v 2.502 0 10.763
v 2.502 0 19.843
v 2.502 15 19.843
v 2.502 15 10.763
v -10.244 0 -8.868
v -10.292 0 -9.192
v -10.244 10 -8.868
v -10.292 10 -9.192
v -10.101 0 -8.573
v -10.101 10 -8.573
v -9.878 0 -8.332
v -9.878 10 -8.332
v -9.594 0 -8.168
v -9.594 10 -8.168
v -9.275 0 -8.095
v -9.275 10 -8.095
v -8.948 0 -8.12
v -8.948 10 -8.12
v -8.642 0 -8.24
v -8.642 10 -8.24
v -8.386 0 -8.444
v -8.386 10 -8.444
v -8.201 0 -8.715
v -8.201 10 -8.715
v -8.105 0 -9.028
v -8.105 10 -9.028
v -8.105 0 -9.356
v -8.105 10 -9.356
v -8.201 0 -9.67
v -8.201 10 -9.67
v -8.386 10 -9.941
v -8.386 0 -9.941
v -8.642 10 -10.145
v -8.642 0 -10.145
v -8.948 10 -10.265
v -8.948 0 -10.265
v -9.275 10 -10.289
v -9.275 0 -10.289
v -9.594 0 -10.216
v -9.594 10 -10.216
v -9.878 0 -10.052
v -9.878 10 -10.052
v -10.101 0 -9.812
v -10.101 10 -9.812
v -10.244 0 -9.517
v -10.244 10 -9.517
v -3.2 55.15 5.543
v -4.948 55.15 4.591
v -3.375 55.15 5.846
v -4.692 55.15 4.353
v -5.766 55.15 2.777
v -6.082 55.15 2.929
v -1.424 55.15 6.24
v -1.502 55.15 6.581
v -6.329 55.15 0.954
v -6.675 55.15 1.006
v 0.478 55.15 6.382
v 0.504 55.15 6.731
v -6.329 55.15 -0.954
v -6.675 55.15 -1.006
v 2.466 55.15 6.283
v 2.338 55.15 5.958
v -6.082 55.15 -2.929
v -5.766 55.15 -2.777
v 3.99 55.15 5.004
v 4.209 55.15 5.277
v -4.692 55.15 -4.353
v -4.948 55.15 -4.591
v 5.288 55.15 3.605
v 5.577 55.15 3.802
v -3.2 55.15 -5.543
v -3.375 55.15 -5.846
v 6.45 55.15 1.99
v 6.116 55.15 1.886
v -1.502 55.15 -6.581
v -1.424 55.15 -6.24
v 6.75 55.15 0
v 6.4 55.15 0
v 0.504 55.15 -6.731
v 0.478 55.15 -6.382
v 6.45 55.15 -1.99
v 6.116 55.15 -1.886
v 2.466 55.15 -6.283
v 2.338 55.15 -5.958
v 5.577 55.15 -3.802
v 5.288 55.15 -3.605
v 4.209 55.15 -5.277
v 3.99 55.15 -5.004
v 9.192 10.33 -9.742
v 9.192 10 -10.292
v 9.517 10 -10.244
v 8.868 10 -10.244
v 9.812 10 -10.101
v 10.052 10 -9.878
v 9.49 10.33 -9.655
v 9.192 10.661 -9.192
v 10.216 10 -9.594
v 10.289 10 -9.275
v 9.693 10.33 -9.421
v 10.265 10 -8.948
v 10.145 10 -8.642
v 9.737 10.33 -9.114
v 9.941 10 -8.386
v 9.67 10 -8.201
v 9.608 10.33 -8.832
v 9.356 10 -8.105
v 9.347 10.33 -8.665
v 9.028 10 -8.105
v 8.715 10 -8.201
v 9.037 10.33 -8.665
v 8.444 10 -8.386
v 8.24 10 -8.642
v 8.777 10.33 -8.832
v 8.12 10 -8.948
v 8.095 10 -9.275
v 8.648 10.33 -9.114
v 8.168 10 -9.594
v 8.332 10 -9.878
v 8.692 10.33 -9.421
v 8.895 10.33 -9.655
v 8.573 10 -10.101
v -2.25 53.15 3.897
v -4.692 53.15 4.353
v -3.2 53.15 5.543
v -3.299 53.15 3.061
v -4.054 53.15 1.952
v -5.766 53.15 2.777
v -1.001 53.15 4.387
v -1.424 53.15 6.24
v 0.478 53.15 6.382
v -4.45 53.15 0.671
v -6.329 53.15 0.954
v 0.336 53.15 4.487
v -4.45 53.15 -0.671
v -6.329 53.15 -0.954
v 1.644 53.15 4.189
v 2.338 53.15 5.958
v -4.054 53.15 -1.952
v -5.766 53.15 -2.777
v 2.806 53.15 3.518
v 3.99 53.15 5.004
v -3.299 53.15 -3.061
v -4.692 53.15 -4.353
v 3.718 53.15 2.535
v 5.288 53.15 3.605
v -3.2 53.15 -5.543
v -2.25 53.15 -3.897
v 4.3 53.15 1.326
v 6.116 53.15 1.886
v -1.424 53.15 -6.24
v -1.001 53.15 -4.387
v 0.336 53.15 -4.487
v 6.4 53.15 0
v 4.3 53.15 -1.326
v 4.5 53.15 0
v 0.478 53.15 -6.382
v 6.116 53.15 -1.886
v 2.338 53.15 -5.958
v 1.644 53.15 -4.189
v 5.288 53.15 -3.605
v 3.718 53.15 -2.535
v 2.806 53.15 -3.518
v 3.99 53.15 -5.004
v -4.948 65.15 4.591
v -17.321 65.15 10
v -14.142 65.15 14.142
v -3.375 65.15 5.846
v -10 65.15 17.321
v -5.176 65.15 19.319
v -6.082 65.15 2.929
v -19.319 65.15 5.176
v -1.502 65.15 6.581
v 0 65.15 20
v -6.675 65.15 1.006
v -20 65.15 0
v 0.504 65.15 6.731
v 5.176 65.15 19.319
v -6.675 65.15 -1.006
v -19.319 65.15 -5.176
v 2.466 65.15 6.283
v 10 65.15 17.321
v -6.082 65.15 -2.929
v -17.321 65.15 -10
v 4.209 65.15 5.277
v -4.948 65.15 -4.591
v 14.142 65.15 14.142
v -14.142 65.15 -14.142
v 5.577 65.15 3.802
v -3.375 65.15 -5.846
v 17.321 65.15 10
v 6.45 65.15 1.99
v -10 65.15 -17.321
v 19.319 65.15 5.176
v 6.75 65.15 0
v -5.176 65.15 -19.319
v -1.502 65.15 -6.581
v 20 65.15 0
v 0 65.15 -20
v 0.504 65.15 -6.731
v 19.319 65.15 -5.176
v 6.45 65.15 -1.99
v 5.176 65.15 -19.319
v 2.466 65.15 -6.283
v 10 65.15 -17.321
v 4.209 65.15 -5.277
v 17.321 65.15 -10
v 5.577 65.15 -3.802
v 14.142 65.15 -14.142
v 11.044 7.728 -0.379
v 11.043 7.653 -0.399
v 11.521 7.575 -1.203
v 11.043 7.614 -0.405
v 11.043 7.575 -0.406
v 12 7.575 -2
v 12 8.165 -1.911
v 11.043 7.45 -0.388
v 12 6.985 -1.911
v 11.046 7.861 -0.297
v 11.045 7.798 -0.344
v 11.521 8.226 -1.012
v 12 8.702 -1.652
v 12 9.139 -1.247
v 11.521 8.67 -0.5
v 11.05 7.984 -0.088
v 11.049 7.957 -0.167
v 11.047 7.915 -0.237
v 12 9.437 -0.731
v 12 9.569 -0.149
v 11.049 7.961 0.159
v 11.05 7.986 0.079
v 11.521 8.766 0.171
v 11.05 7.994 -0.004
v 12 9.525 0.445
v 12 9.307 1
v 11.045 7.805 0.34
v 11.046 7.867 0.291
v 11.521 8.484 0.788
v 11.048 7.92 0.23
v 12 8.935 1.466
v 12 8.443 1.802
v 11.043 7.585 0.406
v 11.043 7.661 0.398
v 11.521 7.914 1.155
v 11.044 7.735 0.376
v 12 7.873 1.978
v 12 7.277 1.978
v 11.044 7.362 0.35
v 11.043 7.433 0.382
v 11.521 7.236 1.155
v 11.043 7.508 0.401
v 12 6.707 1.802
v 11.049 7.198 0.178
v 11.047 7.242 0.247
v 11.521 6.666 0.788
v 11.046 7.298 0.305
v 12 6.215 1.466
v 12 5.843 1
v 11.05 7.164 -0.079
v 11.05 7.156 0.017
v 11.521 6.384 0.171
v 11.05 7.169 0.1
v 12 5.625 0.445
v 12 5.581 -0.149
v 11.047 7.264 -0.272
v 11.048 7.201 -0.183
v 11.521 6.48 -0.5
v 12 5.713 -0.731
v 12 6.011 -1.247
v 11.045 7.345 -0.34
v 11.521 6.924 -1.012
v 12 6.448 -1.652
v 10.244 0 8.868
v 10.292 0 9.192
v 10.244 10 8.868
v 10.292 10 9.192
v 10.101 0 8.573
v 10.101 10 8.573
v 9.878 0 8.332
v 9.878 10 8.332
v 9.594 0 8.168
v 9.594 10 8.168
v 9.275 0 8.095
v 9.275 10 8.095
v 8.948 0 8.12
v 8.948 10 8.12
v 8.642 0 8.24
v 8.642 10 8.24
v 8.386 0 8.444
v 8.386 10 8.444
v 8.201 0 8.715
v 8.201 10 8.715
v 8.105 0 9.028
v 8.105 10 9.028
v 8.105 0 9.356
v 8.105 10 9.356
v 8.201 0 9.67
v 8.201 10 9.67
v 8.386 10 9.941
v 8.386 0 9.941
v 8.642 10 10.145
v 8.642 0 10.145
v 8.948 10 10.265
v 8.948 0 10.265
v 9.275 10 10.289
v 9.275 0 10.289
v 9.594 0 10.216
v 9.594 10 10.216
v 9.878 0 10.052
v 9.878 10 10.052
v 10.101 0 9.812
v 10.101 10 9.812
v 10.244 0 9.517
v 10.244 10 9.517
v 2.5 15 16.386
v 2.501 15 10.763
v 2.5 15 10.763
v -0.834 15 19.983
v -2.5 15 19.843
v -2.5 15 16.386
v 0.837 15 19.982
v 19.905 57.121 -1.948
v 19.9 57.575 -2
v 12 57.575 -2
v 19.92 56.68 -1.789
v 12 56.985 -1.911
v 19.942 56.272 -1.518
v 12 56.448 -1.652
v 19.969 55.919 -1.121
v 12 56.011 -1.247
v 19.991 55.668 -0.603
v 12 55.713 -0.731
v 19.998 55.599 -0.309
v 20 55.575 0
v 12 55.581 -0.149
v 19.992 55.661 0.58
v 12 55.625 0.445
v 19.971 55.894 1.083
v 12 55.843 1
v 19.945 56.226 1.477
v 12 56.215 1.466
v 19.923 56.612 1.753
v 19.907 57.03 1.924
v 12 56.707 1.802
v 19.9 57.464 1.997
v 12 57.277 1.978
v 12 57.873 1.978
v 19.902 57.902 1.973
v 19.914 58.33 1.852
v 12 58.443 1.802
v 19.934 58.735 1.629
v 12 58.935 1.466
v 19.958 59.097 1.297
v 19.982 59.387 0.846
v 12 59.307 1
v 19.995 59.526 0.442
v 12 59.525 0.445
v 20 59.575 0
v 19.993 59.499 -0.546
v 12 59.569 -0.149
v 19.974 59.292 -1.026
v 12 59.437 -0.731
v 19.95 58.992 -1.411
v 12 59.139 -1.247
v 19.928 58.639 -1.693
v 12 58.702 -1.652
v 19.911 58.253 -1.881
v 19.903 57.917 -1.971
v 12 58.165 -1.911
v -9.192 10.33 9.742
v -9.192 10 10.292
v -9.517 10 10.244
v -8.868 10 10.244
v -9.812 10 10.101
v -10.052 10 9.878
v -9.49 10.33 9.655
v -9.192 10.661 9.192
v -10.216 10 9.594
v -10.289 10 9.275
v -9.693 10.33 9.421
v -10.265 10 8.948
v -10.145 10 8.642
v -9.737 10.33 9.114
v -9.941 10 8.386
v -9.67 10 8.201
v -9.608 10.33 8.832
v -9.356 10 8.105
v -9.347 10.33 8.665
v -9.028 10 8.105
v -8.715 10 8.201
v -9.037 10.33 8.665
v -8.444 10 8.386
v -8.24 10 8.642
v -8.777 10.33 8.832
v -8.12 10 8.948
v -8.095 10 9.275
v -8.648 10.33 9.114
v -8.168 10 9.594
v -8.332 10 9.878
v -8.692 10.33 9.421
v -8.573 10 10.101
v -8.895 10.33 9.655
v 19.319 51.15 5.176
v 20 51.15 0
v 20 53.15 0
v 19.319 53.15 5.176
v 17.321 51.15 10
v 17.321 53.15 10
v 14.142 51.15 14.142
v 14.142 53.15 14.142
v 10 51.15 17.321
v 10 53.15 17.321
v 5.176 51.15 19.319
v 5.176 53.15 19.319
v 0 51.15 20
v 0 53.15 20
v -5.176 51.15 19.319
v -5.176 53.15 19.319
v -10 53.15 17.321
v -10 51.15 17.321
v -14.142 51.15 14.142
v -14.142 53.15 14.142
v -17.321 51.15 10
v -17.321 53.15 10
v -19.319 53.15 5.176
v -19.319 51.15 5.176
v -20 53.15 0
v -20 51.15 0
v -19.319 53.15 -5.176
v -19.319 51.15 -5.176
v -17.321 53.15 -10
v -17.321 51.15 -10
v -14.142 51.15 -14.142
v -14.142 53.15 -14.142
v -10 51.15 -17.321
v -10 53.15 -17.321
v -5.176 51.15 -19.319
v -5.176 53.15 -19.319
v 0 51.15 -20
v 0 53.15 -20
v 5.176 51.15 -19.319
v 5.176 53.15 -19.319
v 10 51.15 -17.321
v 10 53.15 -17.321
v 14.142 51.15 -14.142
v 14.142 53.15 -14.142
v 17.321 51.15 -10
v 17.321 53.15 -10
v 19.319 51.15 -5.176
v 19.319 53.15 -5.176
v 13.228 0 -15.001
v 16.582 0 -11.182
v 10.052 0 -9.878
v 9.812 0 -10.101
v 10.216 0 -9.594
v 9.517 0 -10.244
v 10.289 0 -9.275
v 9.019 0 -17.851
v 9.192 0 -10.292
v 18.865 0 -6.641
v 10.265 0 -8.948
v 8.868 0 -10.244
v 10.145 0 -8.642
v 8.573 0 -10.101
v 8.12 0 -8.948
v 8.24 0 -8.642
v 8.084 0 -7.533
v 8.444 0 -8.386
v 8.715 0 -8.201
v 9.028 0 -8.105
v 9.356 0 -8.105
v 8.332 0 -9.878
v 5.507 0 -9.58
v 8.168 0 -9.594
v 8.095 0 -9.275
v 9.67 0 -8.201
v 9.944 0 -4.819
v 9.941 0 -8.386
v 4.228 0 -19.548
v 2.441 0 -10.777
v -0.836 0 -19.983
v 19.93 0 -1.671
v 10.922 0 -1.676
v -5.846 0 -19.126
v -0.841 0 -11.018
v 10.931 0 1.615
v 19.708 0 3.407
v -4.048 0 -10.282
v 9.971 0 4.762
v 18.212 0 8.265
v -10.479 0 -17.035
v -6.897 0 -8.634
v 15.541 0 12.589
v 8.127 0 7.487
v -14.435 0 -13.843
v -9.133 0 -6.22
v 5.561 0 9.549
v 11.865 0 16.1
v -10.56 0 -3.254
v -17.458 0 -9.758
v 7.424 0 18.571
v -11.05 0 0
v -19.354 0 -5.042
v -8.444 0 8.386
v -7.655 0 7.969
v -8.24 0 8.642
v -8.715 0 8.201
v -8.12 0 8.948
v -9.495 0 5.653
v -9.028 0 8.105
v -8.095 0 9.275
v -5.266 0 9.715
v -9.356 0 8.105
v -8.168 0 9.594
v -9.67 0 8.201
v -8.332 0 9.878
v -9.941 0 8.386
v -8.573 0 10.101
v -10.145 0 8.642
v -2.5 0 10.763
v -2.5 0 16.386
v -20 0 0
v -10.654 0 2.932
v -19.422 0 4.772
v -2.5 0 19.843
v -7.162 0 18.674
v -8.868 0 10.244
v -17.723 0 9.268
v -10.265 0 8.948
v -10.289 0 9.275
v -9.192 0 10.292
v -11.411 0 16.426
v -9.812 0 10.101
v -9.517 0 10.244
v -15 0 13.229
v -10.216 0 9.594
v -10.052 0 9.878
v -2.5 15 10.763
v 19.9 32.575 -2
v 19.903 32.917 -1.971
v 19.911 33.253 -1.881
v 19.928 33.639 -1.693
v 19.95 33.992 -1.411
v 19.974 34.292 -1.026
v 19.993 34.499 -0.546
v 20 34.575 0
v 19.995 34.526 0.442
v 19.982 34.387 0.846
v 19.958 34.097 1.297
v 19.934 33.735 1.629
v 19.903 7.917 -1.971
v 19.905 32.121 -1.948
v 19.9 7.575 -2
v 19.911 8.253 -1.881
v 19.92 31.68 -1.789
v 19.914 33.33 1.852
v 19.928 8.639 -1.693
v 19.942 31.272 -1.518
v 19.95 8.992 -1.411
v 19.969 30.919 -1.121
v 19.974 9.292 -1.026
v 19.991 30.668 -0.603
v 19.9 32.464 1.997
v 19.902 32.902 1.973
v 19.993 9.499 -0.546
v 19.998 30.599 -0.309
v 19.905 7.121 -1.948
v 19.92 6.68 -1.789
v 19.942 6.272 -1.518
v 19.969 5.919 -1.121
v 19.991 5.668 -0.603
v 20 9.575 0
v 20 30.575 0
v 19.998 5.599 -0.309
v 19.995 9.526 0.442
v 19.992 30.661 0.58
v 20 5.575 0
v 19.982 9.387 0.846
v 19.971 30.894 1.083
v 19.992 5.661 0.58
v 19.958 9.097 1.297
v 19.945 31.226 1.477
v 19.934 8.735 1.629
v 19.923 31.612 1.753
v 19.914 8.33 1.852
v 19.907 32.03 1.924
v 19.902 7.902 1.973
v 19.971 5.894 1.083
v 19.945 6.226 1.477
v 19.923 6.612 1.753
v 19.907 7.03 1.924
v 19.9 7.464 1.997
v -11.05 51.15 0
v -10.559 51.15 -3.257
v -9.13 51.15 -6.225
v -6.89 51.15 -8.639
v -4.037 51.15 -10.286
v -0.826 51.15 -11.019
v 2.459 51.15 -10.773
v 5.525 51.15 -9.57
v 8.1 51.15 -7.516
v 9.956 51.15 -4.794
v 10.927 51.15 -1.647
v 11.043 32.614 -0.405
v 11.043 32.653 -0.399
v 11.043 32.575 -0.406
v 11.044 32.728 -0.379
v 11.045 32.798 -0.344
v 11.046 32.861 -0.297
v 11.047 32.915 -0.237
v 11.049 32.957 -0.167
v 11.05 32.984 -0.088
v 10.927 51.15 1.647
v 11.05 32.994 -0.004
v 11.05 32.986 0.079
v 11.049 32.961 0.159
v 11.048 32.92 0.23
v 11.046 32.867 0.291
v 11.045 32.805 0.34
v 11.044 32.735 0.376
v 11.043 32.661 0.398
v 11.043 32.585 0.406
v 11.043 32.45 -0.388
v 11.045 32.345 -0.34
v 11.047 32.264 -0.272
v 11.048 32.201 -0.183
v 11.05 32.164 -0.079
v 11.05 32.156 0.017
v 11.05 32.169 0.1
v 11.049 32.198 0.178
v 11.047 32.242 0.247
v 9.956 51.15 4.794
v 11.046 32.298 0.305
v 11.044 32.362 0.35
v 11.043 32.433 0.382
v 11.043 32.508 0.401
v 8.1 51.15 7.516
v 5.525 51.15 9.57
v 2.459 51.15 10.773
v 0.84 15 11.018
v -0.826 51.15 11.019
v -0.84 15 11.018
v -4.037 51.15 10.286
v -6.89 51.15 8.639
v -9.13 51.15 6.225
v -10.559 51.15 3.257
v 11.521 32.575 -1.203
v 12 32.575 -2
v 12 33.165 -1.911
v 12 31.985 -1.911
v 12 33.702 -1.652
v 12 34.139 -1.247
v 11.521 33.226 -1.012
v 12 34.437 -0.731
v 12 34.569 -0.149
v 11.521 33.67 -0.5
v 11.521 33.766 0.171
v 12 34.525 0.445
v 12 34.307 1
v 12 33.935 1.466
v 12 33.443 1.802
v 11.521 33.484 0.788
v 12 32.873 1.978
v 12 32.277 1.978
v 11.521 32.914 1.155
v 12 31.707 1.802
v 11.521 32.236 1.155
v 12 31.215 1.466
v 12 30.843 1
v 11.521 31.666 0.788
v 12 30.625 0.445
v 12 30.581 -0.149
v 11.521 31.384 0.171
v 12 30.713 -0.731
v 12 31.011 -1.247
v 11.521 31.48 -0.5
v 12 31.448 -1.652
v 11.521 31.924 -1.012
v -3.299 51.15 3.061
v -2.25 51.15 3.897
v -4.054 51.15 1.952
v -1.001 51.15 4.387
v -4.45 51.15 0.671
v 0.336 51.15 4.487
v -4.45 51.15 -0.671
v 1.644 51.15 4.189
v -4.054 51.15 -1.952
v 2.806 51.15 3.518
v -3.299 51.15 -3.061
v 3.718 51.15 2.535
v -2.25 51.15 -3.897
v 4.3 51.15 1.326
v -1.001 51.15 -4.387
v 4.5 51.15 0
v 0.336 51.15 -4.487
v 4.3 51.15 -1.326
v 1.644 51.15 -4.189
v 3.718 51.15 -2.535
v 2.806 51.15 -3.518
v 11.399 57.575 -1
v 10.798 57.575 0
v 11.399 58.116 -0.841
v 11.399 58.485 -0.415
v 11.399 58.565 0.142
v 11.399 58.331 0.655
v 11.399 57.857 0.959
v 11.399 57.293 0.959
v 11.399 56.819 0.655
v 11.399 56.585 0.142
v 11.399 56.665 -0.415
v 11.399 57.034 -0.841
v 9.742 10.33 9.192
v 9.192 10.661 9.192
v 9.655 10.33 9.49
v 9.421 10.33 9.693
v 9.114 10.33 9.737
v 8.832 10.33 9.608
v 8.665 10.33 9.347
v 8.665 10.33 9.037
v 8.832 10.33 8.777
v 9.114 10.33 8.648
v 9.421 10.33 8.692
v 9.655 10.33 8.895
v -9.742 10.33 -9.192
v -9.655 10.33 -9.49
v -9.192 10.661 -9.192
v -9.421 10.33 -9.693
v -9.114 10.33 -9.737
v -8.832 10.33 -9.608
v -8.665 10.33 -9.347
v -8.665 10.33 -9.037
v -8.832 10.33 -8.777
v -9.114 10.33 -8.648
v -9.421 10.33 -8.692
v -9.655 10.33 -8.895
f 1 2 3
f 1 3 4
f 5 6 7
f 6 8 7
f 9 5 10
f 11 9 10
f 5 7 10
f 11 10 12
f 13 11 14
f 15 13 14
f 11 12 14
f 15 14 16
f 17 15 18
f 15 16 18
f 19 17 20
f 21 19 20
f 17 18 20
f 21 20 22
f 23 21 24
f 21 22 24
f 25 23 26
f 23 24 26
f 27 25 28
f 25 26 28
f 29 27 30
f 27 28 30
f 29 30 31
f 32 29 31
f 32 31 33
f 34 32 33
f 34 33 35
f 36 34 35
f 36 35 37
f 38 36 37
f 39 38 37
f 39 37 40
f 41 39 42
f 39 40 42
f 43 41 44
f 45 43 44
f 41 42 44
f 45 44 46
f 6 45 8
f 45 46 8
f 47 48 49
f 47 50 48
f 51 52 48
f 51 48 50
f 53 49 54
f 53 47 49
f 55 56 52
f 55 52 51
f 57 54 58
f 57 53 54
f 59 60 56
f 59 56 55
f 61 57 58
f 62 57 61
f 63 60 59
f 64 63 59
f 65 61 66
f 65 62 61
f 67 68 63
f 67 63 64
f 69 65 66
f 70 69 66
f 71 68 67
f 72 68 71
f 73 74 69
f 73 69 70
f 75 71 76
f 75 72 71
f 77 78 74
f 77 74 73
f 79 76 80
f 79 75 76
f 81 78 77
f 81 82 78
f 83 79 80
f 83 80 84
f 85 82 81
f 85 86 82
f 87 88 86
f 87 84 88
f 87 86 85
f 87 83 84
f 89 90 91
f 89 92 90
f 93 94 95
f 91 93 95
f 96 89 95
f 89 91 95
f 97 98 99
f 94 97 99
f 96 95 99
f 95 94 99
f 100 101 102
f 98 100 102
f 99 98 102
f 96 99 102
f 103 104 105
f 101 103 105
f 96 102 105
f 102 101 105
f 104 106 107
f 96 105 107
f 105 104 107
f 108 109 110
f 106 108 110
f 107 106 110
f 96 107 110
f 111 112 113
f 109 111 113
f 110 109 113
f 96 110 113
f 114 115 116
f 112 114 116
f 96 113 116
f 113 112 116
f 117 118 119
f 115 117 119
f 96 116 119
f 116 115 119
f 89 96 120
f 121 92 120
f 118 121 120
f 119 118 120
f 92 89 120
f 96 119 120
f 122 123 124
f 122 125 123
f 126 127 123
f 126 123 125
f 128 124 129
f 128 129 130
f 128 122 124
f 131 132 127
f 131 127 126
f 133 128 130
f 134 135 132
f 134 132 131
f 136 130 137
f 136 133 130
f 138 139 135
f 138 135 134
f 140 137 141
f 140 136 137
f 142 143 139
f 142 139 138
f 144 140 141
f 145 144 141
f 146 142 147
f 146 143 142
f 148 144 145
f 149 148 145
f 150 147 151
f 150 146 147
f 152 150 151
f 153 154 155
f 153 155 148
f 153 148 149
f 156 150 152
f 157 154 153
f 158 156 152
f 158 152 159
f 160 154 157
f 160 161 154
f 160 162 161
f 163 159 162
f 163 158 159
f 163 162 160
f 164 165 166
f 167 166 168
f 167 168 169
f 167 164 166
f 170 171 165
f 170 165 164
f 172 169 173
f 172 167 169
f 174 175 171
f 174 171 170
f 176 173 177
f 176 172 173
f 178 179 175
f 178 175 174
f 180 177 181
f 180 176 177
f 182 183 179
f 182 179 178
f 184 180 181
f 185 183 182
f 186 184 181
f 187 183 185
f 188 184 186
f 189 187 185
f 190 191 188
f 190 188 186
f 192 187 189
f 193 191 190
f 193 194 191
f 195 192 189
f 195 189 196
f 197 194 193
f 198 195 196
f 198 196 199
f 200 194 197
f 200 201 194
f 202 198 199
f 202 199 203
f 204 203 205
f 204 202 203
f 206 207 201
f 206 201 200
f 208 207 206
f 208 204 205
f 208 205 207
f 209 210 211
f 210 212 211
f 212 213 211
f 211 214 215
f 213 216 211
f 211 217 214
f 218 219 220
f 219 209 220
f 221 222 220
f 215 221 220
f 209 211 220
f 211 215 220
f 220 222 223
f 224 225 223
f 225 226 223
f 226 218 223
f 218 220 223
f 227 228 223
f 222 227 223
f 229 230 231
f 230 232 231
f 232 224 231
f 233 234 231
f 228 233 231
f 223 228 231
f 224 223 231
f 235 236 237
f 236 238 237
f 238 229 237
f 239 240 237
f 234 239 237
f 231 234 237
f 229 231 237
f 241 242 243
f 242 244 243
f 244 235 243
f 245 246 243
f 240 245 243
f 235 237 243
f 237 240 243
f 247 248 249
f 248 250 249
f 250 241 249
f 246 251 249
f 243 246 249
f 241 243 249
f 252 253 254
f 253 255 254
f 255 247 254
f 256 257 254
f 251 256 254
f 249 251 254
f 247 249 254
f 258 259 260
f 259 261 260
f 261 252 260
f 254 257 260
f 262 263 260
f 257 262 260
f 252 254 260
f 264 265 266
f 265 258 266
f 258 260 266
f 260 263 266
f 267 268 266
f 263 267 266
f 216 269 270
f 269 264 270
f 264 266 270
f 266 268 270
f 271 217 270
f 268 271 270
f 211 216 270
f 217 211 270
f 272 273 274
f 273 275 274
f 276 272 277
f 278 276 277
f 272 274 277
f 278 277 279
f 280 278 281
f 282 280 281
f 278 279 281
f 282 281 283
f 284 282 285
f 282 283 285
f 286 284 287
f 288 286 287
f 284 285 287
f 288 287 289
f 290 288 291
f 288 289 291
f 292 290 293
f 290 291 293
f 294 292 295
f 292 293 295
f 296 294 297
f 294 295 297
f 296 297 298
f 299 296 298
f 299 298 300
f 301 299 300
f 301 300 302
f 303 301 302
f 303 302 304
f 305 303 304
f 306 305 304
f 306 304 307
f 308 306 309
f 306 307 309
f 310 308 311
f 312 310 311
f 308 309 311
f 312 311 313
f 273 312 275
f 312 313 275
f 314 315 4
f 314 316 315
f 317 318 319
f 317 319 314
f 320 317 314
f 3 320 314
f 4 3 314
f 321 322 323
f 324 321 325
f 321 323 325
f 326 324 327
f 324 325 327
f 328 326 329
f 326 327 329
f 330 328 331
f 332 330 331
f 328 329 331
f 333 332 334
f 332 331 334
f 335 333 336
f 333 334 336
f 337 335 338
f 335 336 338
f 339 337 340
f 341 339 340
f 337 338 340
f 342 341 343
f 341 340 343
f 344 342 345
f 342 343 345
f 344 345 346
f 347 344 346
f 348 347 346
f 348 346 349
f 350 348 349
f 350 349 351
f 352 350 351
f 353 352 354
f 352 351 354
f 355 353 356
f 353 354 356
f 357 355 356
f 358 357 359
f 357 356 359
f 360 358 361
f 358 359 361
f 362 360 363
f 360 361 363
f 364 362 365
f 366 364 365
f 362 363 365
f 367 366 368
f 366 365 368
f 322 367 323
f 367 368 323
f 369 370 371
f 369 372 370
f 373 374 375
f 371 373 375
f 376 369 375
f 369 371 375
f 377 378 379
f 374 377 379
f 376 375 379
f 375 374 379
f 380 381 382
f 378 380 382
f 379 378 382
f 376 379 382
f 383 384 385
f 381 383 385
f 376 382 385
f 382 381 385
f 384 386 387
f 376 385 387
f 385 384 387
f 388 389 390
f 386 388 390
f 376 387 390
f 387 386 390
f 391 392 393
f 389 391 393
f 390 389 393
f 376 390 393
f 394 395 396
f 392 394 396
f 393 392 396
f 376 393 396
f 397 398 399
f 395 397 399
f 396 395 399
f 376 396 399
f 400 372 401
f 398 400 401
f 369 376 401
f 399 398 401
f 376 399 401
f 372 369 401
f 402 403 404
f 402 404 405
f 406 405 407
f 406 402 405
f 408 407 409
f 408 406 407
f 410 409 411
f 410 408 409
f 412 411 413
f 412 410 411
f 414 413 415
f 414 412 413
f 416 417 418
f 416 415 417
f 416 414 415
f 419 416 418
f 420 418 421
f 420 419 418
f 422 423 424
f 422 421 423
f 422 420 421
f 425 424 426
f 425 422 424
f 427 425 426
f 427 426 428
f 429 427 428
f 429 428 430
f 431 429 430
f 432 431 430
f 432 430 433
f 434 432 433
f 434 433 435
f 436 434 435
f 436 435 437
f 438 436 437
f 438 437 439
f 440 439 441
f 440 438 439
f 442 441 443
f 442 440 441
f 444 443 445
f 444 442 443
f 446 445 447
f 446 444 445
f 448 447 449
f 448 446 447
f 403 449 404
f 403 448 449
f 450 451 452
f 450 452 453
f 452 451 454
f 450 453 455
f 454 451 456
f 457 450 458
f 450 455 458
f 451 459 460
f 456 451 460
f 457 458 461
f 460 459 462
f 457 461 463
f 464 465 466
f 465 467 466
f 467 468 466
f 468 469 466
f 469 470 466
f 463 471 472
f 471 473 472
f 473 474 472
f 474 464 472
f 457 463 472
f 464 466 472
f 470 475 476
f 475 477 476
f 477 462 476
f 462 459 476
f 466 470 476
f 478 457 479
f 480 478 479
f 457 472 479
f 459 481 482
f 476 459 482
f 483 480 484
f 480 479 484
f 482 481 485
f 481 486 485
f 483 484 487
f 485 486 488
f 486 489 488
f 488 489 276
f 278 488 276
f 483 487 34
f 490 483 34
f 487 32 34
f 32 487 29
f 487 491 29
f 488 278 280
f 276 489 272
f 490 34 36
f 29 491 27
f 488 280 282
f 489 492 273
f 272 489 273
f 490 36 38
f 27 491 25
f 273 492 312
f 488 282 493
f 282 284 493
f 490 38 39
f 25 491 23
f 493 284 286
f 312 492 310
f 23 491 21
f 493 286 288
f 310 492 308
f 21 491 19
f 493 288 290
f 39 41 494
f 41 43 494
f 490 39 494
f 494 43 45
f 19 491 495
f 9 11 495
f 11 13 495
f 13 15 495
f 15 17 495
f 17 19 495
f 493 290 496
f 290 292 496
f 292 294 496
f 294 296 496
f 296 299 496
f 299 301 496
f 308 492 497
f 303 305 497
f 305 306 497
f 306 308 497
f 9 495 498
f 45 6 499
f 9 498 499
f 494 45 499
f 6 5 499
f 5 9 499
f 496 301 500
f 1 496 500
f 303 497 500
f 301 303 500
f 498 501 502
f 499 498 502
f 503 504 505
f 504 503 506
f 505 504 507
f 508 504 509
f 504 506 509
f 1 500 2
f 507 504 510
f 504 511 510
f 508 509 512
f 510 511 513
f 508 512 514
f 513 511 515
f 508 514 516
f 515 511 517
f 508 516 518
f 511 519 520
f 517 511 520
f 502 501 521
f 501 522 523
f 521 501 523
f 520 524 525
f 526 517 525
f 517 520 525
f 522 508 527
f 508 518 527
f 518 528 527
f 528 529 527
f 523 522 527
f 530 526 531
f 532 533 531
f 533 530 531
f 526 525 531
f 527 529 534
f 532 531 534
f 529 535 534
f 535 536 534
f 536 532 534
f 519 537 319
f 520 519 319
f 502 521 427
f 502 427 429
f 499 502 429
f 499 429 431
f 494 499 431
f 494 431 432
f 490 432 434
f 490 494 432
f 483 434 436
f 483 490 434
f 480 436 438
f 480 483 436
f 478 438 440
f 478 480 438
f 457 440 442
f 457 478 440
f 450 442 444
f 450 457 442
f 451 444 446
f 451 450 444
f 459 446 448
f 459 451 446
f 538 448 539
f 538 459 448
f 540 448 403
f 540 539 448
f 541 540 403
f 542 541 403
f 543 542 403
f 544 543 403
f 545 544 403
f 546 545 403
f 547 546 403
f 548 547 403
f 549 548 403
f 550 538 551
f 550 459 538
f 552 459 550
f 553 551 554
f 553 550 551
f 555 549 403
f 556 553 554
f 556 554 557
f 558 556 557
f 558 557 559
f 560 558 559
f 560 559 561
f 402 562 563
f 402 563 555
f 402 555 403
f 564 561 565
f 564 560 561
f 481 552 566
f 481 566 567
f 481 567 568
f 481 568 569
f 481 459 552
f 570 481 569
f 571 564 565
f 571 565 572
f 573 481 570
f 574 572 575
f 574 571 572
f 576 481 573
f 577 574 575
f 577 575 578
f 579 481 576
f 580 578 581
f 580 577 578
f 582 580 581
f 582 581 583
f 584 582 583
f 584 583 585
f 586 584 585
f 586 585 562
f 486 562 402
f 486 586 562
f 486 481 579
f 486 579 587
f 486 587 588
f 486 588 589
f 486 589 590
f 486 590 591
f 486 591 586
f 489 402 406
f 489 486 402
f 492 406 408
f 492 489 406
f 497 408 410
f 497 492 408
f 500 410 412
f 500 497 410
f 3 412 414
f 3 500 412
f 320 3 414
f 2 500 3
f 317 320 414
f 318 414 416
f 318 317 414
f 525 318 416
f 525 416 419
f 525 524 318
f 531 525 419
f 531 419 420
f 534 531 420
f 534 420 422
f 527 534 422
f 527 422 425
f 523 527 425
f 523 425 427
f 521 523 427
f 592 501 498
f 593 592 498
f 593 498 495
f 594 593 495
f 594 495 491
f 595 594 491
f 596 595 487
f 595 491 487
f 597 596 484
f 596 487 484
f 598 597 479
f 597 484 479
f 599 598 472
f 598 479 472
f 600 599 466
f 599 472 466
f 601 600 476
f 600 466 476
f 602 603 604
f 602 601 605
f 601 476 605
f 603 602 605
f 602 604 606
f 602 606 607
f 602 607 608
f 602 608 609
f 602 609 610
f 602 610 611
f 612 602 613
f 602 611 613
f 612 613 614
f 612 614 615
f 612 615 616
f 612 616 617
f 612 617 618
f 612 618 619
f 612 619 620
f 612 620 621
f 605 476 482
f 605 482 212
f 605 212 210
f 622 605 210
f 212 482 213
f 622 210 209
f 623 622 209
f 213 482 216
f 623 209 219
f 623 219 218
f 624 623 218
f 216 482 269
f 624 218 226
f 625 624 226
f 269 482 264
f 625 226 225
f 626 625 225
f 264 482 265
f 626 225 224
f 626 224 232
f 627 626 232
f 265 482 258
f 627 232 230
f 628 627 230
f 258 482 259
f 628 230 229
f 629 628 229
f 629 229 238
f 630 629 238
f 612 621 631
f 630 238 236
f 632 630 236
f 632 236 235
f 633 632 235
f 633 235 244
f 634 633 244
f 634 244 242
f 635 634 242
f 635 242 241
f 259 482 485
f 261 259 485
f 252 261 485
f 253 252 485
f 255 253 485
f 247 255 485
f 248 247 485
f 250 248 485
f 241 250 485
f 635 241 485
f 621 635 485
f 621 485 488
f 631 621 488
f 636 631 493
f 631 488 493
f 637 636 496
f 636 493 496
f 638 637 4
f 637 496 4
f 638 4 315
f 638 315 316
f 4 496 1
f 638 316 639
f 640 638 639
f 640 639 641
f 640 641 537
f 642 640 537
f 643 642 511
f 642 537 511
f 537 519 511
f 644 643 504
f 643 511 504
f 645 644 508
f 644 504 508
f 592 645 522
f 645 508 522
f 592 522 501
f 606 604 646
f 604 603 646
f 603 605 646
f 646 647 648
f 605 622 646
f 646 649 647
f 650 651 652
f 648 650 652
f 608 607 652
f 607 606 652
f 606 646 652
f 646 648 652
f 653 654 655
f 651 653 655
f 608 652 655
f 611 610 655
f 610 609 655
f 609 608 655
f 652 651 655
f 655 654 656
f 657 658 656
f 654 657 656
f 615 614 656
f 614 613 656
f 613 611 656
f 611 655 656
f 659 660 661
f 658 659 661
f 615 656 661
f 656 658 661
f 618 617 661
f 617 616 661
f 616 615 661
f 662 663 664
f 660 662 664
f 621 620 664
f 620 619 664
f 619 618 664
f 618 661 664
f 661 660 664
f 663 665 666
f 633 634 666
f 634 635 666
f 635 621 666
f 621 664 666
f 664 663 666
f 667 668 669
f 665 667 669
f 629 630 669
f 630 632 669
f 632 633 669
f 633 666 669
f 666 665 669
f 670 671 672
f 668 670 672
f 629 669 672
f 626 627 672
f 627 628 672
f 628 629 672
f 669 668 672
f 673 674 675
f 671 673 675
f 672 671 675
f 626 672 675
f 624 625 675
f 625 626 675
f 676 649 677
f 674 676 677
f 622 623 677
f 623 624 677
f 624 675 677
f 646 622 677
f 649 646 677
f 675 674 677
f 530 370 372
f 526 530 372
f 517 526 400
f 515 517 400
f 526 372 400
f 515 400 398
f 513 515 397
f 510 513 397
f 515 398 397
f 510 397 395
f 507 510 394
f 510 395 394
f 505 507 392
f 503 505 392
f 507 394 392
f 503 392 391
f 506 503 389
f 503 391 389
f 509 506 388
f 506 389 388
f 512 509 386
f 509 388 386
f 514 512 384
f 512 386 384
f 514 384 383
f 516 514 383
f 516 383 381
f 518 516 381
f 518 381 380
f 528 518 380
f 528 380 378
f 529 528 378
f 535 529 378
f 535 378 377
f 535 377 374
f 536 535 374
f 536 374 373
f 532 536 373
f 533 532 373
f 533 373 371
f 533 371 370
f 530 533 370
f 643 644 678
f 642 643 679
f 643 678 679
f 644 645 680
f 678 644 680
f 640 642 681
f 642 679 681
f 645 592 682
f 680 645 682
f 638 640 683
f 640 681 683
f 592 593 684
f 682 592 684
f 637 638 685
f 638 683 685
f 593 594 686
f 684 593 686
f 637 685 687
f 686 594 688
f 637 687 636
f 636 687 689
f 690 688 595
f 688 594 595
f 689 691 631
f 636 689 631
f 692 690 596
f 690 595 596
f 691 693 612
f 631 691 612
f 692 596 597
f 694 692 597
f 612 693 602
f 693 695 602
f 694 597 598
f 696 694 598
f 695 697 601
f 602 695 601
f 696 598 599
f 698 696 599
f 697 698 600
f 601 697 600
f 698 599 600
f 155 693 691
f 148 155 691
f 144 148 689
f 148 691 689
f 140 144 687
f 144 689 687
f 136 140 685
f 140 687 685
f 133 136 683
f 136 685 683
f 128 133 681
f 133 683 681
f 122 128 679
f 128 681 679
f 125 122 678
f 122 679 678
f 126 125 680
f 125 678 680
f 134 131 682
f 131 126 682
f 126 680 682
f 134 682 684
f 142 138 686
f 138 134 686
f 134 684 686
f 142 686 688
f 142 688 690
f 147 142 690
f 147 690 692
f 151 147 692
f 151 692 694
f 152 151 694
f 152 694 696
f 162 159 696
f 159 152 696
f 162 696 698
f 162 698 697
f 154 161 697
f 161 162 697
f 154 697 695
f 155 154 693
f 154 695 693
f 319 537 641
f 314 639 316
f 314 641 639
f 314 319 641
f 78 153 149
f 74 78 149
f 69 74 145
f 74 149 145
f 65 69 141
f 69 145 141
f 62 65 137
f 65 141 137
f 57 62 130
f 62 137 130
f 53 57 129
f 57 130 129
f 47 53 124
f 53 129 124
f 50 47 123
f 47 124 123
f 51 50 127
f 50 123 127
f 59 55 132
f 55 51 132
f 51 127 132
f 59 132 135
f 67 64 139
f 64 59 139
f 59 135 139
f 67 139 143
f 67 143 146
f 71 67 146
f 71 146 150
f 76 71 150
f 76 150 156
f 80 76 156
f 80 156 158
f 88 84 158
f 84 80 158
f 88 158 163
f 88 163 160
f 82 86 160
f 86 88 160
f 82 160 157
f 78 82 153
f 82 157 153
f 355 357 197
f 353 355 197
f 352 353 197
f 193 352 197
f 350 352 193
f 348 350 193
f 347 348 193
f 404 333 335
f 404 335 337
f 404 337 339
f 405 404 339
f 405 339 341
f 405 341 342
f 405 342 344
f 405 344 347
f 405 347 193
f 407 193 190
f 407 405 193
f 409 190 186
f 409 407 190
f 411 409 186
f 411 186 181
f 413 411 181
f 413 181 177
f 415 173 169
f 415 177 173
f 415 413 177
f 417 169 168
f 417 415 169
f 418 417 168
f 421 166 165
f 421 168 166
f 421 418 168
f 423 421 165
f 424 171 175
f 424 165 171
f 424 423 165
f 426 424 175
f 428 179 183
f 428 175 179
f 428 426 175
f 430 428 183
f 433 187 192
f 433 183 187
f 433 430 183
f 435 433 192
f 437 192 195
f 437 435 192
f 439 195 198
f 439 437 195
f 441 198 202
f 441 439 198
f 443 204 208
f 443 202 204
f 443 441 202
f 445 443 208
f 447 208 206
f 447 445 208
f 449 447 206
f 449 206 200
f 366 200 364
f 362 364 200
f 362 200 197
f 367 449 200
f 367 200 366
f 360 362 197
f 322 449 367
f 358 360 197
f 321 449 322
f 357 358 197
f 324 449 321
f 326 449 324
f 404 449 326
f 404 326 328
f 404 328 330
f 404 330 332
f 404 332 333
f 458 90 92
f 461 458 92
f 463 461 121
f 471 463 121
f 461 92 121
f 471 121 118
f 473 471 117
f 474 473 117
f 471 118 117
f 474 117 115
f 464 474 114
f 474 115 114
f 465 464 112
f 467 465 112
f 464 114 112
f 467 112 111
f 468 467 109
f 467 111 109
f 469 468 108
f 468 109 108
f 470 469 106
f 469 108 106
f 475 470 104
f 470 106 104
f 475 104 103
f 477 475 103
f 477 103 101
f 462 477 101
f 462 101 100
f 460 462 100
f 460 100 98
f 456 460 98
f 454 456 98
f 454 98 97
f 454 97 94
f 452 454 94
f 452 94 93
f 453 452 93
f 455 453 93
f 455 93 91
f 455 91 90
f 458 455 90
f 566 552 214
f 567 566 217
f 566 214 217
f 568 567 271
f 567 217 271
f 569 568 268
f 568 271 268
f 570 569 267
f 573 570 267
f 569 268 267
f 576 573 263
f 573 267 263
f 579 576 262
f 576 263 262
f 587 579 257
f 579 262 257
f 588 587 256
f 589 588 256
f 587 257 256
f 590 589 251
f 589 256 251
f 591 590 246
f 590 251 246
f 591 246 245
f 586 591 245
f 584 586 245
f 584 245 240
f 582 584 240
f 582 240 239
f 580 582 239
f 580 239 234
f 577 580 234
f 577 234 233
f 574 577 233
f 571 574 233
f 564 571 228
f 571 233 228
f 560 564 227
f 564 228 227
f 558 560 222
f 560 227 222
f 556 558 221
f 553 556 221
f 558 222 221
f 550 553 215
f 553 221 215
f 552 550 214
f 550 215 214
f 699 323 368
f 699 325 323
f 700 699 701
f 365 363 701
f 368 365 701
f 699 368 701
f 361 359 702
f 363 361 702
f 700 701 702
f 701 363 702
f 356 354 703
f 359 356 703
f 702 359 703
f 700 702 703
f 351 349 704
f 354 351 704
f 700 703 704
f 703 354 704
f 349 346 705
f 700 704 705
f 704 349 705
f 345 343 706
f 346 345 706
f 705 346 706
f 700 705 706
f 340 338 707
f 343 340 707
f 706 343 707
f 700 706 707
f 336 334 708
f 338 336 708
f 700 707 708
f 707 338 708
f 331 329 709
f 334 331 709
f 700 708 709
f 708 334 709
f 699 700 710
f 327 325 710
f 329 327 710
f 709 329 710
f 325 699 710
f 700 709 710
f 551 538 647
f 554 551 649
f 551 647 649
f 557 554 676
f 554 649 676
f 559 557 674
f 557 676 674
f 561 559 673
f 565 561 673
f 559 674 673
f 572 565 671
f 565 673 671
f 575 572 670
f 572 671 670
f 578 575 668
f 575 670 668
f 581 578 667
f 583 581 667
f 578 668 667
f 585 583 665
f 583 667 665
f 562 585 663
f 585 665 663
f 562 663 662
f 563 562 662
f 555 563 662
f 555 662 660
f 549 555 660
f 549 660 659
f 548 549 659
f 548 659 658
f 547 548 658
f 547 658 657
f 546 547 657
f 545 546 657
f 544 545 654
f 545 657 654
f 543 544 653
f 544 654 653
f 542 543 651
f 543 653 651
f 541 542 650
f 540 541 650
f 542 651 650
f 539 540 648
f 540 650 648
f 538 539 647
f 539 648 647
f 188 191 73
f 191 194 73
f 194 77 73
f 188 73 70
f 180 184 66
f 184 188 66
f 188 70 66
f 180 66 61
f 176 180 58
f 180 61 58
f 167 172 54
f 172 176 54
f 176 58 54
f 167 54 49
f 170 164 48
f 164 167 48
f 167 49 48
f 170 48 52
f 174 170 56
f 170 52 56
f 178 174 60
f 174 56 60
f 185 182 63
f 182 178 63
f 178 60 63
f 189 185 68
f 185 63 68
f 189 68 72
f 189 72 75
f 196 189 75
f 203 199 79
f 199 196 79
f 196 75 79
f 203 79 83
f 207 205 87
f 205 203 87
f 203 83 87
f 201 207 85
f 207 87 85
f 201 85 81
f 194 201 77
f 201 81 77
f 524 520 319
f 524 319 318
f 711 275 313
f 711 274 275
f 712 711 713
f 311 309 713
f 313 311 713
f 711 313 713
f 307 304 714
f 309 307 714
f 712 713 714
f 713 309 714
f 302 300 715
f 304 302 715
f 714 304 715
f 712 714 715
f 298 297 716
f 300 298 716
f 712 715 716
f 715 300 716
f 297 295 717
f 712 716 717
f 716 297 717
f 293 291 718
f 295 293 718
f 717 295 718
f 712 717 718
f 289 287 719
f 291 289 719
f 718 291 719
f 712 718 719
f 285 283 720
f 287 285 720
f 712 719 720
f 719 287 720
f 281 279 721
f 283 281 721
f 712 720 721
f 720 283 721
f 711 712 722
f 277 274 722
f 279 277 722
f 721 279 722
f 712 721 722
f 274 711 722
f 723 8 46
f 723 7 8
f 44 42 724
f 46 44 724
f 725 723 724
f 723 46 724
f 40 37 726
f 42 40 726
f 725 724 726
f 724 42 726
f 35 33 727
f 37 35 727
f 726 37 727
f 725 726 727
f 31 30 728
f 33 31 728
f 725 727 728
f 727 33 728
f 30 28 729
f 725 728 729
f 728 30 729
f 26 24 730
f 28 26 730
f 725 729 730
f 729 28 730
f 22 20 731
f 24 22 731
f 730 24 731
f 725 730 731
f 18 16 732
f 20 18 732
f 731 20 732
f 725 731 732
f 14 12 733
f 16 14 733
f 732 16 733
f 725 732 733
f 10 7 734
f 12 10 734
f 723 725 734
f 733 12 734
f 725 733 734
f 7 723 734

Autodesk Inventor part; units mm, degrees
ref_plane "XZ Plane" through (0, 0, 0) normal (0, 1, 0) x (-1, 0, 0)
ref_plane "XY Plane" through (0, 0, 0) normal (0, 0, 1) x (1, 0, 0)
sketch "Sketch1" plane through (0, 0, 0) normal (0, 1, 0) x (-1, 0, 0)
  circle A0 centre (0, 0) radius 20
  circle A1 centre (0, 0) radius 11.05
  dimension "d0" = 40
  dimension "d1" = 22.1
extrude "Extrusion1" add sketch "Sketch1" along normal blind 51.15
sketch "Sketch2" plane through (0, 0, 0) normal (0, -1, 0) x (1, 0, 0)
  circle A0 centre (0, 0) radius 13
  line L0 (0, 0) -> (9.1924, 0)
  line L1 (9.1924, 0) -> (9.1924, -9.1924)
  line L2 (9.1924, -9.1924) -> (0, -9.1924)
  line L3 (0, -9.1924) -> (0, 0)
  dimension "d4" = 26
  dimension "d5" = 9.1924
hole "Hole1" at (9.1924, 0, -9.1924) direction (0, 1, 0) diameter 2.2 depth 10 tip angle 118
pattern_circular "Circular Pattern1" count 4 over 360 about axis through (0, 0, 0) along (0, 1, 0) of "Hole1"
thread "Thread1" size "M2.2x0.25" class "6H" standard "ISO Metric profile" full length
thread "Thread3" size "M2.2x0.25" class "6H" standard "ISO Metric profile" full length
thread "Thread4" size "M2.2x0.25" class "6H" standard "ISO Metric profile" full length
thread "Thread5" size "M2.2x0.25" class "6H" standard "ISO Metric profile" full length
sketch "Sketch3" plane through (0, 51.15, 0) normal (0, 1, 0) x (1, 0, 0)
  circle A0 centre (0, 0) radius 20
  circle A1 centre (0, 0) radius 4.5
  dimension "d26" = 40
  dimension "d27" = 9
extrude "Extrusion2" add sketch "Sketch3" along normal blind 2
sketch "Sketch4" plane through (0, 53.15, 0) normal (0, 1, 0) x (1, 0, 0)
  point P0 (0, 0)
sketch "Sketch5" plane through (0, 53.15, 0) normal (0, 1, 0) x (1, 0, 0)
  circle A0 centre (0, 0) radius 6.75
  circle A1 centre (0, 0) radius 20
  dimension "d30" = 13.5
  dimension "d31" = 40
extrude "Extrusion3" add sketch "Sketch5" along normal blind 12
thread "Thread6" size "M14x0.5" class "6H" standard "ISO Metric profile" full length
sketch "Sketch8" plane through (0, 0, 0) normal (0, -1, 0) x (1, 0, 0)
  point P0 (0, 0)
sketch "Sketch9" plane through (0, 0, 0) normal (0, -1, 0) x (1, 0, 0)
  line L0 (0, 9.7277) -> (2.5, 9.7277)
  line L1 (2.5, 9.7277) -> (2.5, 16.3855)
  line L2 (2.5, 16.3855) -> (0, 16.3855)
  line L3 (0, 16.3855) -> (0, 9.7277)
  line L4 (0, 9.7277) -> (-2.5, 9.7277)
  line L5 (-2.5, 9.7277) -> (-2.5, 16.3855)
  line L6 (-2.5, 16.3855) -> (0, 16.3855)
  line L7 (0, 16.3855) -> (0, 9.7277)
  point P0 (0, 0)
  dimension "d1" = 22.1
  dimension "d54" = 2.5
  dimension "d55" = 2.5
extrude "Extrusion4" cut sketch "Sketch9" against normal blind 15
sketch "Sketch10" plane through (0, 0, 0) normal (1, 0, 0) x (0, 1, 0)
  point P0 (0, 0)
ref_plane "Work Plane1" through (20, 0, 0) normal (1, 0, 0) x (0, 1, 0)
sketch "Sketch15" plane through (0, 0, 0) normal (0, -1, 0) x (1, 0, 0)
  line L0 (2.5024, 10.6669) -> (-2.5, 10.6669)
  line L1 (-2.5, 10.6669) -> (-2.5, 24.5822)
  line L2 (-2.5, 24.5822) -> (2.5024, 24.5822)
  line L3 (2.5024, 24.5822) -> (2.5024, 10.6669)
  point P0 (0, 0)
extrude "Extrusion5" cut sketch "Sketch15" against normal blind 15
sketch "Sketch18" plane through (20, 0, 0) normal (1, 0, 0) x (0, 1, 0)
  line L0 (0, 0) -> (7.575, 0)
  line L1 (7.575, 0) -> (32.575, 0)
  line L2 (32.575, 0) -> (57.575, 0)
  dimension "d102" = 7.575
  dimension "d103" = 25
  dimension "d104" = 25
  dimension "d105" = 180
hole "Hole6" at (20, 57.575, 0) direction (-1, 0, 0) diameter 4 depth 8 tip angle 118
hole "Hole7" at (20, 7.575, 0) at (20, 32.575, 0) direction (-1, 0, 0) diameter 4 depth 8 tip angle 118
thread "Thread7" size "M4x0.7" class "6H" standard "ANSI Metric M Profile" full length
thread "Thread8" size "M4x0.7" class "6H" standard "ANSI Metric M Profile" full length
thread "Thread9" size "M4x0.7" class "6H" standard "ANSI Metric M Profile" full length
sketch "Sketch19" plane through (0, 53.15, 0) normal (0, 1, 0) x (1, 0, 0)
  circle A0 centre (0, 0) radius 6.75
  circle A1 centre (0, 0) radius 6.4
  dimension "d128" = 13.5
  dimension "d129" = 12.8
extrude "Extrusion6" add sketch "Sketch19" along normal blind 2
thread "Thread11" size "M14x0.5" class "6H" standard "ANSI Metric M Profile" length 10
equation "\"d43\" = 60deg"
equation "\"Sketch6_Pitch\" = 0.5"
properties part number "enclosire2"
